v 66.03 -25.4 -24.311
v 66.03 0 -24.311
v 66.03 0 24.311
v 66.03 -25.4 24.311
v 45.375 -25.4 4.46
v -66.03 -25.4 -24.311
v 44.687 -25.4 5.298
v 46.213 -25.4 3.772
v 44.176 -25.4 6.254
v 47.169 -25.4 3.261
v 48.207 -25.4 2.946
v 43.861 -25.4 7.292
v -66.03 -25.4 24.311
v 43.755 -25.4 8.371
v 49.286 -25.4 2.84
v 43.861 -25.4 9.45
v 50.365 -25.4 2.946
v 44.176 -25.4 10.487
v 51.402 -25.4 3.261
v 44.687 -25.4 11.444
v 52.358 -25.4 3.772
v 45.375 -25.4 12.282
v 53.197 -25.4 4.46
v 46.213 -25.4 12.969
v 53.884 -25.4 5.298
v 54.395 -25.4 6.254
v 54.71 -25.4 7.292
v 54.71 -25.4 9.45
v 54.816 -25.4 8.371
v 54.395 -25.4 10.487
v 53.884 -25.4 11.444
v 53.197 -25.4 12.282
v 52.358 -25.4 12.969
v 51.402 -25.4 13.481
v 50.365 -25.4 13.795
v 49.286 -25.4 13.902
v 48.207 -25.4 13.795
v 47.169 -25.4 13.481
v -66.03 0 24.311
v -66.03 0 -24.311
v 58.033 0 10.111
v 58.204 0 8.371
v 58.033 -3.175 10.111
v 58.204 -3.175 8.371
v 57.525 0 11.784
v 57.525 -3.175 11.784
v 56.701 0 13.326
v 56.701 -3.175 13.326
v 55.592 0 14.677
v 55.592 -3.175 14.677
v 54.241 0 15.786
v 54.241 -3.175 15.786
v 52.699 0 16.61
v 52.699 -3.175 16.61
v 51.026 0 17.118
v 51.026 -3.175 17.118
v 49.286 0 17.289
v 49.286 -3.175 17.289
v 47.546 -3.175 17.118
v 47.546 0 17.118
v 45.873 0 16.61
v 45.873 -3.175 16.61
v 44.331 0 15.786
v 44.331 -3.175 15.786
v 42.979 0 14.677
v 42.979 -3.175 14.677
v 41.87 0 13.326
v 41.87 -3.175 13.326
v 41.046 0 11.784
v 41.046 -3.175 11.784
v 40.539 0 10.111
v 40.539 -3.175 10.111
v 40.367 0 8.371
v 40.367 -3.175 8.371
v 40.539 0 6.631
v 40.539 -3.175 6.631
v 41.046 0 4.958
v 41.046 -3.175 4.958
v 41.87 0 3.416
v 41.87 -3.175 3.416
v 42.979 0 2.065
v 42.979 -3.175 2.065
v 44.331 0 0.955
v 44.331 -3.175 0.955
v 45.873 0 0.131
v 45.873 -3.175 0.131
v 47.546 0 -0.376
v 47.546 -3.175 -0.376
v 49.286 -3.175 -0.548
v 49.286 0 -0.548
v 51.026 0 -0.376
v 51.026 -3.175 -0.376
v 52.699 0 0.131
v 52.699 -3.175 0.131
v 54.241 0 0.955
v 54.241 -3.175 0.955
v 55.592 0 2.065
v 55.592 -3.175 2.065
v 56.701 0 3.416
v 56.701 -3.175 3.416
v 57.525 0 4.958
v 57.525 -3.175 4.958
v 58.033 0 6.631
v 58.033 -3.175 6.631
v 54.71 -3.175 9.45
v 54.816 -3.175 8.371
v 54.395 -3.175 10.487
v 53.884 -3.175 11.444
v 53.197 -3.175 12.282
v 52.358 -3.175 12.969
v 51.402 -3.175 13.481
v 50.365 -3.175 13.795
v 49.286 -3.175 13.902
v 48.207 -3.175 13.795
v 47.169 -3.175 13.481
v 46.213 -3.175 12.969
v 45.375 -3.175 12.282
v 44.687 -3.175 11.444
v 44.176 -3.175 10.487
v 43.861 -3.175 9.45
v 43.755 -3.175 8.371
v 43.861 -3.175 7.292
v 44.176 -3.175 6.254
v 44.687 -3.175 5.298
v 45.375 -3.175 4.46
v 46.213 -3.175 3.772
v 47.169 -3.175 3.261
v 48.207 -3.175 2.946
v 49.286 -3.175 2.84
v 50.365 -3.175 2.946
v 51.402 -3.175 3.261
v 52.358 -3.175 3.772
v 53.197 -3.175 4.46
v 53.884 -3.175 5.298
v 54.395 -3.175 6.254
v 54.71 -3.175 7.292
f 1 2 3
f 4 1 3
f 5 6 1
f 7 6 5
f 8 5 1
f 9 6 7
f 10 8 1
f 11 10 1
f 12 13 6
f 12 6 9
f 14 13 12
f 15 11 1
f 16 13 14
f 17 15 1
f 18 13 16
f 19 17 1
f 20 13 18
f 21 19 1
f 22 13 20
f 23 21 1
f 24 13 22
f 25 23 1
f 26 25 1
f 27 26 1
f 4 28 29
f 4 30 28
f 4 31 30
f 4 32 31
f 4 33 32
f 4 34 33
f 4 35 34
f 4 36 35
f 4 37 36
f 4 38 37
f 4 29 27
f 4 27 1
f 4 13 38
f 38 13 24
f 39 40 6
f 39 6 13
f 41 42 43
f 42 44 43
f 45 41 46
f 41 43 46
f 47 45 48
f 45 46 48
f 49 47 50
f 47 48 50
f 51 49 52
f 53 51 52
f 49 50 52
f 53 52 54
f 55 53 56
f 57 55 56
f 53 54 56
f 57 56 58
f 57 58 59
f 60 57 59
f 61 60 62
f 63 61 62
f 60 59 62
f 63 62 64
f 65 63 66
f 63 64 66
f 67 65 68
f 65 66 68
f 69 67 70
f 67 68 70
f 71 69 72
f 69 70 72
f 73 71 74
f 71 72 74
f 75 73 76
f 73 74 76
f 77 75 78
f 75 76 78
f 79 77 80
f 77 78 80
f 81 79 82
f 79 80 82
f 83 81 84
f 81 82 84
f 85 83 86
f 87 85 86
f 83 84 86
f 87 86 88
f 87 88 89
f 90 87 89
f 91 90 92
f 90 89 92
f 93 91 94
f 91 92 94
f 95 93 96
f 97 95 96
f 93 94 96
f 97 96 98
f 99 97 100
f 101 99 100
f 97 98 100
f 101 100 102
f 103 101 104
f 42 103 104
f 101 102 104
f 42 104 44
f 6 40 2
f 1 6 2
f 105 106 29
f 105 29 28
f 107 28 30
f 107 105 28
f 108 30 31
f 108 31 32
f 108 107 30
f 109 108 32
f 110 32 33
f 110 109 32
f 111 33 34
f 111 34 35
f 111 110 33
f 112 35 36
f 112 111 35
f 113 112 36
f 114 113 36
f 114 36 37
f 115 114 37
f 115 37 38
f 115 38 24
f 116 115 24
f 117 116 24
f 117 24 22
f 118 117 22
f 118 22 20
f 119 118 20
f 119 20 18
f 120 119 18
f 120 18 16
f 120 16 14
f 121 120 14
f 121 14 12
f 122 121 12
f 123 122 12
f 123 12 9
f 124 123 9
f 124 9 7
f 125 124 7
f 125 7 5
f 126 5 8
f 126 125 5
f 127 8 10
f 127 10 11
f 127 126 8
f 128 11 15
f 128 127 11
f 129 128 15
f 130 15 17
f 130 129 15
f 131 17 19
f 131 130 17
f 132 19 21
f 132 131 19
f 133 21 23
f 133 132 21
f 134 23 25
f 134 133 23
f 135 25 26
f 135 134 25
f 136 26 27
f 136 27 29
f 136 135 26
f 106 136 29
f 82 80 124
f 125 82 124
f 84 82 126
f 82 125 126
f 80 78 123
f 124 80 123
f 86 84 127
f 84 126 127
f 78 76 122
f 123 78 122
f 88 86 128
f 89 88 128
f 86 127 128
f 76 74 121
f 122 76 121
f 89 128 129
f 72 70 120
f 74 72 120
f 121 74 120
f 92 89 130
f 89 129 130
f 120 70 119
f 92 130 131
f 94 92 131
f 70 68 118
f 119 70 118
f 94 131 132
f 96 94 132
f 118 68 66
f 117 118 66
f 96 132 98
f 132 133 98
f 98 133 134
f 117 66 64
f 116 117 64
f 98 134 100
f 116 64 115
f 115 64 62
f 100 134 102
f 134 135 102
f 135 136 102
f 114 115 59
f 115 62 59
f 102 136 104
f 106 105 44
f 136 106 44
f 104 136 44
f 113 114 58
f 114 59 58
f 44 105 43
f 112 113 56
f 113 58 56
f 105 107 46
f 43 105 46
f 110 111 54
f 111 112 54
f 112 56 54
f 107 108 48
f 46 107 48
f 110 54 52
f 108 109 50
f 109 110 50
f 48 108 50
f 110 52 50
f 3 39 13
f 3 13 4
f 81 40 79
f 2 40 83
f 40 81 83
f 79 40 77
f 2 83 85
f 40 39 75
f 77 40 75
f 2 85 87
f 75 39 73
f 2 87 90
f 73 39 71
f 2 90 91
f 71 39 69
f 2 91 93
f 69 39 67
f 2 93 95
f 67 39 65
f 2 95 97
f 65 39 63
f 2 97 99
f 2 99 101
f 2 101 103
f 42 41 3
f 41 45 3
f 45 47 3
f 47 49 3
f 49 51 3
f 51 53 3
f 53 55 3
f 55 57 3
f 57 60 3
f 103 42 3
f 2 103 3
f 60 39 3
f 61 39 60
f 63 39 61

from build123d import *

# Parameters (mm, degrees)
F0_W     = 132.060304
F0_H     = 48.622414
F0_R     = 8.918459
F0_R_2   = 5.530692
F1_DEPTH = 25.4
F2_DEPTH = 3.175


with BuildPart() as f1:
    # F0 (on Front) → F1 (new body)
    with BuildSketch(Plane.XZ):
        Rectangle(F0_W, F0_H)
        with Locations((49.285725, 8.370818)):
            Circle(F0_R, mode=Mode.SUBTRACT)
        with Locations((49.285725, 8.370818)):
            Circle(F0_R)
        with Locations((49.285725, 8.370818)):
            Circle(F0_R_2, mode=Mode.SUBTRACT)
    extrude(amount=F1_DEPTH)

    # F0 (on Front) → F2 (cut, symmetric)
    with BuildSketch(Plane.XZ):
        with Locations((49.285725, 8.370818)):
            Circle(F0_R)
        with Locations((49.285725, 8.370818)):
            Circle(F0_R_2, mode=Mode.SUBTRACT)
    extrude(amount=F2_DEPTH, both=True, mode=Mode.SUBTRACT)


solid = f1.part
